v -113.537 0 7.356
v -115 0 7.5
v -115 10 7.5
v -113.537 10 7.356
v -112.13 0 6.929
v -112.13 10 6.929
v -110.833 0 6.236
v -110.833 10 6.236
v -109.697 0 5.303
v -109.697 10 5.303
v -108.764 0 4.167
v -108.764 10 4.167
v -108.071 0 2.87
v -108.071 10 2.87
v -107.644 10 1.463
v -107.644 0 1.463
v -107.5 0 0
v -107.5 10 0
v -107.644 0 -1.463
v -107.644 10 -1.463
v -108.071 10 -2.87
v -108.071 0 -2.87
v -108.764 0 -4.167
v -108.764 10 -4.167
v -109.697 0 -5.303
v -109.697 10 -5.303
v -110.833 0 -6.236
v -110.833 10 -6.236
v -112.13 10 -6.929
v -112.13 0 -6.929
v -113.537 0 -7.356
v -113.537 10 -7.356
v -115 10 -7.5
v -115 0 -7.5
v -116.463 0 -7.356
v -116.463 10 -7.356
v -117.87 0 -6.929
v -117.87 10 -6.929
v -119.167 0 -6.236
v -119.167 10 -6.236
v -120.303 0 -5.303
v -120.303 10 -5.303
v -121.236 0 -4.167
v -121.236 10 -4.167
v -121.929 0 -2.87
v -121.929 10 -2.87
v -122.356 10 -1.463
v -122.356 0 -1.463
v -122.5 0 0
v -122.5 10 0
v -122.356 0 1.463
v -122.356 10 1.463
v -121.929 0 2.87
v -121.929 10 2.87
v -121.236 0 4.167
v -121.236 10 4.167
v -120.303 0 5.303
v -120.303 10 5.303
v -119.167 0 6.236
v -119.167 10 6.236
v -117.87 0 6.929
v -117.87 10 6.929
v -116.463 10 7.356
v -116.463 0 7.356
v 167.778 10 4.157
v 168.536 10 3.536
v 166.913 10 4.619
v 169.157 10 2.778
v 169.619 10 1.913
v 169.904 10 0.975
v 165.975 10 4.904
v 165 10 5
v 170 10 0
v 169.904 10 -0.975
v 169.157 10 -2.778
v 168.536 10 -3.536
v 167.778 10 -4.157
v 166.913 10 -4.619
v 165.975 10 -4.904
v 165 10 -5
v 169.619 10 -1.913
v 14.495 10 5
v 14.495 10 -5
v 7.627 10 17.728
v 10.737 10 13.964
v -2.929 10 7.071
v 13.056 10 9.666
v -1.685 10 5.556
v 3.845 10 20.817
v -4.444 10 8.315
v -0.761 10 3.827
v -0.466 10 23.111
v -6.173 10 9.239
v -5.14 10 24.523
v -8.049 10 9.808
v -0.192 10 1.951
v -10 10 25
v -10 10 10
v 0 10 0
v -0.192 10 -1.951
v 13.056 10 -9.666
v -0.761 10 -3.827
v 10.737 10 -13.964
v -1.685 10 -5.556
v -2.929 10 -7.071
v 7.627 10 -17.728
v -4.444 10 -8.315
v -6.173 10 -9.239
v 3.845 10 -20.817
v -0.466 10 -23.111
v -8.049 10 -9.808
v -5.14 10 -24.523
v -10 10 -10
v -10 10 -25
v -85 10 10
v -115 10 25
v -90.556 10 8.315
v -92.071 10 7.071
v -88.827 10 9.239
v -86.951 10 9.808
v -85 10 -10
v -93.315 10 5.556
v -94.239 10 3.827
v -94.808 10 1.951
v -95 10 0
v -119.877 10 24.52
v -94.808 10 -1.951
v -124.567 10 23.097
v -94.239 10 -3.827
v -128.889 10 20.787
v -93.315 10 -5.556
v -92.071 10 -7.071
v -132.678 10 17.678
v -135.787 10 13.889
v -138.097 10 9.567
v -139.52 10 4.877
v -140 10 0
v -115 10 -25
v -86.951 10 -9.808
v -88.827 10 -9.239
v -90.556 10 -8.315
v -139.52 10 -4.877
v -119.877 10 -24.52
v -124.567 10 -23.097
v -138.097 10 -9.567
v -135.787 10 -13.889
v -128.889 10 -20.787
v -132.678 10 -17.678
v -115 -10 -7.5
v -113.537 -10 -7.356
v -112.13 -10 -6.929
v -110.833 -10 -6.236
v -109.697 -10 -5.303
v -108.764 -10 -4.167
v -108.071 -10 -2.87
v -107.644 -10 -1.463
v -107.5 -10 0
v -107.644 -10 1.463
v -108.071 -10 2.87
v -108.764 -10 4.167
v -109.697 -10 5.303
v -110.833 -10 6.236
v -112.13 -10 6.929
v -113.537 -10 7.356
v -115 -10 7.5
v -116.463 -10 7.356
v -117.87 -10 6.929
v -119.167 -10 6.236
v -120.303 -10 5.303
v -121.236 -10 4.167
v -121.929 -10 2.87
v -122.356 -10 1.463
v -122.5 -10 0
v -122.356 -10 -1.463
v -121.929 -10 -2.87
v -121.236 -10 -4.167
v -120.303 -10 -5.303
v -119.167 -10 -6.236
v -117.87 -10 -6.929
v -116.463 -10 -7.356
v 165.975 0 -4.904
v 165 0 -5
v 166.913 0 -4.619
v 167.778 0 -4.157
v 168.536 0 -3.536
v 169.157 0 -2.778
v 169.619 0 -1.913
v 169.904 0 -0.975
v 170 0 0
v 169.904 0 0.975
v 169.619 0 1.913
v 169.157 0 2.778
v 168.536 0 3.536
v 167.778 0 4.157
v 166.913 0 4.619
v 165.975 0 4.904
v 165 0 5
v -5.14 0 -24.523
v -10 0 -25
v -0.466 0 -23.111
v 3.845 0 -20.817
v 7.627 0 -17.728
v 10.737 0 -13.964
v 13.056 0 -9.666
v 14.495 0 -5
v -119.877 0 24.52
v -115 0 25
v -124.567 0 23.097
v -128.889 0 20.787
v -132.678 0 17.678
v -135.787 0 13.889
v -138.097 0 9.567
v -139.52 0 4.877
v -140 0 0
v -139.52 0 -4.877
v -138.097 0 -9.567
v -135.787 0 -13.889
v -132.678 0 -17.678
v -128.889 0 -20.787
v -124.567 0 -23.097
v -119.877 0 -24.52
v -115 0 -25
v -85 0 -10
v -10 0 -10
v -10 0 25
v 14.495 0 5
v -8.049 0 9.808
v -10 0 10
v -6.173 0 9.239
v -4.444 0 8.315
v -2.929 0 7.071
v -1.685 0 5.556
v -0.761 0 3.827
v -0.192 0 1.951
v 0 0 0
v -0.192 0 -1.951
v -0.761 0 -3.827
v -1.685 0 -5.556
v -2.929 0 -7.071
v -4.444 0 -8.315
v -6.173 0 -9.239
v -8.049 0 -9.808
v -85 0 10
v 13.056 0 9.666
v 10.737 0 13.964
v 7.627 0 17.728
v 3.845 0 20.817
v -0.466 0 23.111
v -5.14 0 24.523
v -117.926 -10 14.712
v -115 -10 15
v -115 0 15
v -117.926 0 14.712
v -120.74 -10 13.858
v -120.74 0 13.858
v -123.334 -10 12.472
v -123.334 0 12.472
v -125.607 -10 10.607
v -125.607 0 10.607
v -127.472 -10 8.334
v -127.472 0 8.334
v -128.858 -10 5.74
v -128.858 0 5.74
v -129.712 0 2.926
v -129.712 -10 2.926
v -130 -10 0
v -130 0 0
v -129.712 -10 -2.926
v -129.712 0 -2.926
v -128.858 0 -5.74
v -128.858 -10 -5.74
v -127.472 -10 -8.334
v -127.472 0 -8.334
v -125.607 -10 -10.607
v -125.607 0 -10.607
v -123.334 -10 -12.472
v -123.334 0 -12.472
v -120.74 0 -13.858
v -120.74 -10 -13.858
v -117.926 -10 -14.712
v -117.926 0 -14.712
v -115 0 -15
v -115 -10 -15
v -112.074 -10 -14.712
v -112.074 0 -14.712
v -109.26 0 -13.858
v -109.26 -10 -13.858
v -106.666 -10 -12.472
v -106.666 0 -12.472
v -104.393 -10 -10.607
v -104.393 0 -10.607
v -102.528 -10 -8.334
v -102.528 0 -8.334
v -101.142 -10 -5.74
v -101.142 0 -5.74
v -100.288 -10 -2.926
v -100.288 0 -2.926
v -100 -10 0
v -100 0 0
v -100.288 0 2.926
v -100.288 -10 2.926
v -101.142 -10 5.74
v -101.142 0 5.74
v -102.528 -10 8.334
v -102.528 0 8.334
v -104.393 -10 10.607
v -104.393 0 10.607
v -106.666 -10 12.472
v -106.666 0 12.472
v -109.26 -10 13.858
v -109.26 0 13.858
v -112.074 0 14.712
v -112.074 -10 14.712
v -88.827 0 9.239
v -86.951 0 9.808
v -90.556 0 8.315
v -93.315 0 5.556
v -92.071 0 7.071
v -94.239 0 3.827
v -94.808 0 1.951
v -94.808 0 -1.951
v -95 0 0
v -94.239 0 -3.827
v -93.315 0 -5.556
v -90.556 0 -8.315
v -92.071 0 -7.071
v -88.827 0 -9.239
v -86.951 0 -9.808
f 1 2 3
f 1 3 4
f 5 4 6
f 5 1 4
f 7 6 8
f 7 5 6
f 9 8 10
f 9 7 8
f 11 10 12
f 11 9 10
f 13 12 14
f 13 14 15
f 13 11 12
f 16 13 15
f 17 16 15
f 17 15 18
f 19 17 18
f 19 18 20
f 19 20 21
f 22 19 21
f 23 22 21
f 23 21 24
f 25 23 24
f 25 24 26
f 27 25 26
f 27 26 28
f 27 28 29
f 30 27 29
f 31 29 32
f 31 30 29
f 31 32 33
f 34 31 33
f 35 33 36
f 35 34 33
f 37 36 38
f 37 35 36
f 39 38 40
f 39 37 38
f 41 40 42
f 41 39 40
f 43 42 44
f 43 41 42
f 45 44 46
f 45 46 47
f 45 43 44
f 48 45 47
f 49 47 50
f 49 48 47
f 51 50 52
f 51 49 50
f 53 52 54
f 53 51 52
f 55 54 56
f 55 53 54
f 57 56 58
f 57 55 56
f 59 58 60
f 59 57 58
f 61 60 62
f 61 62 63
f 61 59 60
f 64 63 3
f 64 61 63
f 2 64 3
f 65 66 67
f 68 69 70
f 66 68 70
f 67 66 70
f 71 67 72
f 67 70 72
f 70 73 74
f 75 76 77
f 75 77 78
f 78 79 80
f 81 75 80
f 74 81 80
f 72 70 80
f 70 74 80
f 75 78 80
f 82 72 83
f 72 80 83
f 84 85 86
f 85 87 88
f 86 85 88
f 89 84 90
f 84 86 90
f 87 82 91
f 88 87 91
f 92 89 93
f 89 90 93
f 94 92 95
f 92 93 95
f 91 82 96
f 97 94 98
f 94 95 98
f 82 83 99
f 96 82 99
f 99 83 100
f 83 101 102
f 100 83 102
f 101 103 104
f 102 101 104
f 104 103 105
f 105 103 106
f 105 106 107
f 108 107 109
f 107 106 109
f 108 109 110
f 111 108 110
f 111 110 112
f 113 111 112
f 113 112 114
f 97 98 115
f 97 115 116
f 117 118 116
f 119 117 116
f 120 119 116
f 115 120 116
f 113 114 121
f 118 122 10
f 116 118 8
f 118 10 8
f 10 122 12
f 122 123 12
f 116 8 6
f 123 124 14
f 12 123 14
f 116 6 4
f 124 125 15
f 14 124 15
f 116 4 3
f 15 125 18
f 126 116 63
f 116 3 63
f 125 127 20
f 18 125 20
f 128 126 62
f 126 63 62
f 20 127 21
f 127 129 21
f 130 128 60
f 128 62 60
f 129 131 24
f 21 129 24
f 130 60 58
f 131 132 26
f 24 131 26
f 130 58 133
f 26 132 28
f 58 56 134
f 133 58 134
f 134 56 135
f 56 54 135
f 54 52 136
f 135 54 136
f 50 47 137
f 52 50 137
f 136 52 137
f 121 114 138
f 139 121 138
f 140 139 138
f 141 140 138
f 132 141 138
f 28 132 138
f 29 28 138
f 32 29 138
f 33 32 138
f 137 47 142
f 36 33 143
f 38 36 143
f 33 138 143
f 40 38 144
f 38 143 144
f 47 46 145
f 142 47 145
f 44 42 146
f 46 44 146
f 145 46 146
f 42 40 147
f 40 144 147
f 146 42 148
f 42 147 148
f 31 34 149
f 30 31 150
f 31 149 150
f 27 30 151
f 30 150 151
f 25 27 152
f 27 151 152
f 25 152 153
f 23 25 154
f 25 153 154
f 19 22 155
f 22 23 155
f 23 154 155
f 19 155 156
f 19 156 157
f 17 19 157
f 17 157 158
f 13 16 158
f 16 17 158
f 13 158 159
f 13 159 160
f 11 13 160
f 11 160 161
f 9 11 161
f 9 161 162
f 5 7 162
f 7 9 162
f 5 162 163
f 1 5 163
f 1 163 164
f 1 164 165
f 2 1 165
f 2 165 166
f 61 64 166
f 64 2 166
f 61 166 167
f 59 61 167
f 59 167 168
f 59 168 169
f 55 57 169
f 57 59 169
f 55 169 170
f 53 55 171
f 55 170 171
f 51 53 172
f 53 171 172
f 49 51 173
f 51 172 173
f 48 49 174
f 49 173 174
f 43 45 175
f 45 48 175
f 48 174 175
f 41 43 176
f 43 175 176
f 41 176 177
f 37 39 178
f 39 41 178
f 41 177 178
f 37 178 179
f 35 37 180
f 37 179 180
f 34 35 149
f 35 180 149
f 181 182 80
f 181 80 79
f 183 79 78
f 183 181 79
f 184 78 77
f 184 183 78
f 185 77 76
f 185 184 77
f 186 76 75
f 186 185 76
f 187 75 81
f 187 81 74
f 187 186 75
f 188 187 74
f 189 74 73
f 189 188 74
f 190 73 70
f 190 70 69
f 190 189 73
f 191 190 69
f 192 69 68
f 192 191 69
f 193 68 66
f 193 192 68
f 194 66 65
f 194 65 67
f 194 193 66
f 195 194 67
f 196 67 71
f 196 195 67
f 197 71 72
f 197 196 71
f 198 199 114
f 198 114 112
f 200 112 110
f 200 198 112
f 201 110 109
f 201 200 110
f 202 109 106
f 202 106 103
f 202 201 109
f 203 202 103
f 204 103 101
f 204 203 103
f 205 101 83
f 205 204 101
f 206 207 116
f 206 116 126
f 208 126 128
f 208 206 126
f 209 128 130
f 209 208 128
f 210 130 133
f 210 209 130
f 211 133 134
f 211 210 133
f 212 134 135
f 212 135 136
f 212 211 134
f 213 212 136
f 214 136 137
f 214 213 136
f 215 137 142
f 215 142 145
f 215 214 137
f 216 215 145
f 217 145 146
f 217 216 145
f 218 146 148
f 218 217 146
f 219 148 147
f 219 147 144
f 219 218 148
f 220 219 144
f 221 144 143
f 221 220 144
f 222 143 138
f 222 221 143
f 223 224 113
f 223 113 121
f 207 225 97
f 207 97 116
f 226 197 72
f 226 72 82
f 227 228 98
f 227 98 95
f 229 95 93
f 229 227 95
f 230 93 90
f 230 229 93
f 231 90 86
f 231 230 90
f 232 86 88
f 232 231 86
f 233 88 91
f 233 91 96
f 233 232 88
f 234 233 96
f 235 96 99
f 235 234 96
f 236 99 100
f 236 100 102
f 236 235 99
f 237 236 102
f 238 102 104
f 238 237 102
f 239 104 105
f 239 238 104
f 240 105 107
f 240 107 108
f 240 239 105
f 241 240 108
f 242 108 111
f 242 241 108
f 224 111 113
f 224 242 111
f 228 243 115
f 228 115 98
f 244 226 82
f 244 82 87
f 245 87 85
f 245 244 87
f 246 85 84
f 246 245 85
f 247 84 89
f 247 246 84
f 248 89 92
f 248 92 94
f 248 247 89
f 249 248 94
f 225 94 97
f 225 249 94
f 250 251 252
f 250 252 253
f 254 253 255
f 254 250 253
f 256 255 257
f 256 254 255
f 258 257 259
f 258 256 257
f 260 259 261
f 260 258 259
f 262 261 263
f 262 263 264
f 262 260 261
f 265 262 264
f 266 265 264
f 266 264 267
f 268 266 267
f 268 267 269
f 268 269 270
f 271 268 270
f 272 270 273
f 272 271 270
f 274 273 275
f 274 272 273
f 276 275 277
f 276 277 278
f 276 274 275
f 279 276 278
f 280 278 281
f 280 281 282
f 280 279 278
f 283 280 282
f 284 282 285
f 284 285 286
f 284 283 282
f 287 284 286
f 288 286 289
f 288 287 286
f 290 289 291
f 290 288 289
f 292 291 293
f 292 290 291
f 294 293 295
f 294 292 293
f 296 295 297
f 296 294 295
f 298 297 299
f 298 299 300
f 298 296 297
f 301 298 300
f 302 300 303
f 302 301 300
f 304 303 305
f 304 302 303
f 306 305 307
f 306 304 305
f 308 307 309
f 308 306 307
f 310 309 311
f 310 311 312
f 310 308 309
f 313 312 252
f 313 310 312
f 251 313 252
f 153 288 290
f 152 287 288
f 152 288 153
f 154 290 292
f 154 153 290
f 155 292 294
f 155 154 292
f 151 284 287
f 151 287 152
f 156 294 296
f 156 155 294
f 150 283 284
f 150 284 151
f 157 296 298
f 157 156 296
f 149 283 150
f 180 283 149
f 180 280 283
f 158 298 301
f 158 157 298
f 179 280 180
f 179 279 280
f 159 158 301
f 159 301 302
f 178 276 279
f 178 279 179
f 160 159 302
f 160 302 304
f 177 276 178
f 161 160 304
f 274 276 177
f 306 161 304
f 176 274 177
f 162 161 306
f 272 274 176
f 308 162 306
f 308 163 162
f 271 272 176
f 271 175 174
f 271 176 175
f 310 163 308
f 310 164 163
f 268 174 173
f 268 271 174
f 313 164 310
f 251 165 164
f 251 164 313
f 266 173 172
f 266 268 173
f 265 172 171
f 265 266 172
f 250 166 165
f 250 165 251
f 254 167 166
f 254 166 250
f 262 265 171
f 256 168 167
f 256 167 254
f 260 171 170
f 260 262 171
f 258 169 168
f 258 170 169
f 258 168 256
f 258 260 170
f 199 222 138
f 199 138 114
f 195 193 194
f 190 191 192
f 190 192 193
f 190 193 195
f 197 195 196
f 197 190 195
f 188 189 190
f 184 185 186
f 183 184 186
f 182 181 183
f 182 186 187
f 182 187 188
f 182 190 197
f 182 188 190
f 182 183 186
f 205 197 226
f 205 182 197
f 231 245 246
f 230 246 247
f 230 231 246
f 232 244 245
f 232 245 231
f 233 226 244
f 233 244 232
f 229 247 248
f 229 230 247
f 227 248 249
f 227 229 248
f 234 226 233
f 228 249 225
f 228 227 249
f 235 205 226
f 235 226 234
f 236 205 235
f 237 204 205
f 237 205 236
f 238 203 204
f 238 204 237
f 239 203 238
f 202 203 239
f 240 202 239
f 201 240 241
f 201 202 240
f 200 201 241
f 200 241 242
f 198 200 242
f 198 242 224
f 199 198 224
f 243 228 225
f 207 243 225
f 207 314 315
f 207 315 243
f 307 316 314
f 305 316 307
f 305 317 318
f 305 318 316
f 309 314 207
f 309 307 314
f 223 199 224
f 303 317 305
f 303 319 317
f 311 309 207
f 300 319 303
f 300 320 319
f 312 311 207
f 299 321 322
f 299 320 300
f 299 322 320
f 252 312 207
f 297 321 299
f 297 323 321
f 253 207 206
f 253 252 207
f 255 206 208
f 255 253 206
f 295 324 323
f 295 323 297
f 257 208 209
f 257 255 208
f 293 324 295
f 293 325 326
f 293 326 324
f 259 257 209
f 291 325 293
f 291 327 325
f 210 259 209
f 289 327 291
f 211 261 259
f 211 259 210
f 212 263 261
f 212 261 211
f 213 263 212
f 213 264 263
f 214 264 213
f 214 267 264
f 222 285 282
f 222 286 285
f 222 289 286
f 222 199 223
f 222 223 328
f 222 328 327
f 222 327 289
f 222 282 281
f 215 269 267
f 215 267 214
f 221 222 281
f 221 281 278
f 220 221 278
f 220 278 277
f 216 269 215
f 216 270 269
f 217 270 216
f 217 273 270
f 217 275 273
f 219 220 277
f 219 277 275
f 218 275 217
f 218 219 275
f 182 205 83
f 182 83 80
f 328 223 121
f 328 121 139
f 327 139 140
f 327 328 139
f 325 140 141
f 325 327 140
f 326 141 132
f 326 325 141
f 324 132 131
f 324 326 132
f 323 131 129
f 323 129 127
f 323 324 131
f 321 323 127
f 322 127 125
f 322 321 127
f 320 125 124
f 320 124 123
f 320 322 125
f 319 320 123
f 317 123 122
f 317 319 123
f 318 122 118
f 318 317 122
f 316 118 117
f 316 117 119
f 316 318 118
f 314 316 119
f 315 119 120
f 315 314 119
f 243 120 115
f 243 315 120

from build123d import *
from build123d.topology import SkipClean

# Parameters (mm, degrees)
SKETCH1_R           = 7.5
BOSS_EXTRUDE1_DEPTH = 10
BOSS_EXTRUDE2_START = 10
SKETCH2_R           = 15
SKETCH2_R_2         = 7.5
BOSS_EXTRUDE2_DEPTH = 10


with BuildPart() as part:
    # Sketch1 → Boss-Extrude1 (new body)
    with BuildSketch(Plane(origin=(0, 0, 0), x_dir=(1, 0, 0), z_dir=(0, 1, 0))):
        with BuildLine():
            Line((14.494897428, 5), (165, 5))
            ThreePointArc((165, 5), (170, 0), (165, -5))
            Line((165, -5), (14.494897428, -5))
            ThreePointArc((14.494897428, -5), (5.811388301, -19.364916731), (-10, -25))
            Line((-10, -25), (-115, -25))
            ThreePointArc((-115, -25), (-140, 0), (-115, 25))
            Line((-115, 25), (-10, 25))
            ThreePointArc((-10, 25), (5.811388301, 19.364916731), (14.494897428, 5))
        make_face()
        with Locations(Location((-115, 0, 0), (0, 0, 270))):
            Circle(SKETCH1_R, mode=Mode.SUBTRACT)
        with BuildLine():
            ThreePointArc((-85, 10), (-95, 0), (-85, -10))
            Line((-85, -10), (-10, -10))
            ThreePointArc((-10, -10), (0, 0), (-10, 10))
            Line((-10, 10), (-85, 10))
        make_face(mode=Mode.SUBTRACT)
    extrude(amount=BOSS_EXTRUDE1_DEPTH)

    # Sketch2 → Boss-Extrude2 (add)
    with SkipClean():  # the faces are left unmerged after this step: merging them gives an invalid solid
        with BuildSketch(Plane.XZ.offset(BOSS_EXTRUDE2_START)):
            with Locations(Location((-115, 0, 0), (0, 0, 90))):
                Circle(SKETCH2_R)
            with Locations(Location((-115, 0, 0), (0, 0, 270))):
                Circle(SKETCH2_R_2, mode=Mode.SUBTRACT)
        extrude(amount=-BOSS_EXTRUDE2_DEPTH)


solid = part.part
